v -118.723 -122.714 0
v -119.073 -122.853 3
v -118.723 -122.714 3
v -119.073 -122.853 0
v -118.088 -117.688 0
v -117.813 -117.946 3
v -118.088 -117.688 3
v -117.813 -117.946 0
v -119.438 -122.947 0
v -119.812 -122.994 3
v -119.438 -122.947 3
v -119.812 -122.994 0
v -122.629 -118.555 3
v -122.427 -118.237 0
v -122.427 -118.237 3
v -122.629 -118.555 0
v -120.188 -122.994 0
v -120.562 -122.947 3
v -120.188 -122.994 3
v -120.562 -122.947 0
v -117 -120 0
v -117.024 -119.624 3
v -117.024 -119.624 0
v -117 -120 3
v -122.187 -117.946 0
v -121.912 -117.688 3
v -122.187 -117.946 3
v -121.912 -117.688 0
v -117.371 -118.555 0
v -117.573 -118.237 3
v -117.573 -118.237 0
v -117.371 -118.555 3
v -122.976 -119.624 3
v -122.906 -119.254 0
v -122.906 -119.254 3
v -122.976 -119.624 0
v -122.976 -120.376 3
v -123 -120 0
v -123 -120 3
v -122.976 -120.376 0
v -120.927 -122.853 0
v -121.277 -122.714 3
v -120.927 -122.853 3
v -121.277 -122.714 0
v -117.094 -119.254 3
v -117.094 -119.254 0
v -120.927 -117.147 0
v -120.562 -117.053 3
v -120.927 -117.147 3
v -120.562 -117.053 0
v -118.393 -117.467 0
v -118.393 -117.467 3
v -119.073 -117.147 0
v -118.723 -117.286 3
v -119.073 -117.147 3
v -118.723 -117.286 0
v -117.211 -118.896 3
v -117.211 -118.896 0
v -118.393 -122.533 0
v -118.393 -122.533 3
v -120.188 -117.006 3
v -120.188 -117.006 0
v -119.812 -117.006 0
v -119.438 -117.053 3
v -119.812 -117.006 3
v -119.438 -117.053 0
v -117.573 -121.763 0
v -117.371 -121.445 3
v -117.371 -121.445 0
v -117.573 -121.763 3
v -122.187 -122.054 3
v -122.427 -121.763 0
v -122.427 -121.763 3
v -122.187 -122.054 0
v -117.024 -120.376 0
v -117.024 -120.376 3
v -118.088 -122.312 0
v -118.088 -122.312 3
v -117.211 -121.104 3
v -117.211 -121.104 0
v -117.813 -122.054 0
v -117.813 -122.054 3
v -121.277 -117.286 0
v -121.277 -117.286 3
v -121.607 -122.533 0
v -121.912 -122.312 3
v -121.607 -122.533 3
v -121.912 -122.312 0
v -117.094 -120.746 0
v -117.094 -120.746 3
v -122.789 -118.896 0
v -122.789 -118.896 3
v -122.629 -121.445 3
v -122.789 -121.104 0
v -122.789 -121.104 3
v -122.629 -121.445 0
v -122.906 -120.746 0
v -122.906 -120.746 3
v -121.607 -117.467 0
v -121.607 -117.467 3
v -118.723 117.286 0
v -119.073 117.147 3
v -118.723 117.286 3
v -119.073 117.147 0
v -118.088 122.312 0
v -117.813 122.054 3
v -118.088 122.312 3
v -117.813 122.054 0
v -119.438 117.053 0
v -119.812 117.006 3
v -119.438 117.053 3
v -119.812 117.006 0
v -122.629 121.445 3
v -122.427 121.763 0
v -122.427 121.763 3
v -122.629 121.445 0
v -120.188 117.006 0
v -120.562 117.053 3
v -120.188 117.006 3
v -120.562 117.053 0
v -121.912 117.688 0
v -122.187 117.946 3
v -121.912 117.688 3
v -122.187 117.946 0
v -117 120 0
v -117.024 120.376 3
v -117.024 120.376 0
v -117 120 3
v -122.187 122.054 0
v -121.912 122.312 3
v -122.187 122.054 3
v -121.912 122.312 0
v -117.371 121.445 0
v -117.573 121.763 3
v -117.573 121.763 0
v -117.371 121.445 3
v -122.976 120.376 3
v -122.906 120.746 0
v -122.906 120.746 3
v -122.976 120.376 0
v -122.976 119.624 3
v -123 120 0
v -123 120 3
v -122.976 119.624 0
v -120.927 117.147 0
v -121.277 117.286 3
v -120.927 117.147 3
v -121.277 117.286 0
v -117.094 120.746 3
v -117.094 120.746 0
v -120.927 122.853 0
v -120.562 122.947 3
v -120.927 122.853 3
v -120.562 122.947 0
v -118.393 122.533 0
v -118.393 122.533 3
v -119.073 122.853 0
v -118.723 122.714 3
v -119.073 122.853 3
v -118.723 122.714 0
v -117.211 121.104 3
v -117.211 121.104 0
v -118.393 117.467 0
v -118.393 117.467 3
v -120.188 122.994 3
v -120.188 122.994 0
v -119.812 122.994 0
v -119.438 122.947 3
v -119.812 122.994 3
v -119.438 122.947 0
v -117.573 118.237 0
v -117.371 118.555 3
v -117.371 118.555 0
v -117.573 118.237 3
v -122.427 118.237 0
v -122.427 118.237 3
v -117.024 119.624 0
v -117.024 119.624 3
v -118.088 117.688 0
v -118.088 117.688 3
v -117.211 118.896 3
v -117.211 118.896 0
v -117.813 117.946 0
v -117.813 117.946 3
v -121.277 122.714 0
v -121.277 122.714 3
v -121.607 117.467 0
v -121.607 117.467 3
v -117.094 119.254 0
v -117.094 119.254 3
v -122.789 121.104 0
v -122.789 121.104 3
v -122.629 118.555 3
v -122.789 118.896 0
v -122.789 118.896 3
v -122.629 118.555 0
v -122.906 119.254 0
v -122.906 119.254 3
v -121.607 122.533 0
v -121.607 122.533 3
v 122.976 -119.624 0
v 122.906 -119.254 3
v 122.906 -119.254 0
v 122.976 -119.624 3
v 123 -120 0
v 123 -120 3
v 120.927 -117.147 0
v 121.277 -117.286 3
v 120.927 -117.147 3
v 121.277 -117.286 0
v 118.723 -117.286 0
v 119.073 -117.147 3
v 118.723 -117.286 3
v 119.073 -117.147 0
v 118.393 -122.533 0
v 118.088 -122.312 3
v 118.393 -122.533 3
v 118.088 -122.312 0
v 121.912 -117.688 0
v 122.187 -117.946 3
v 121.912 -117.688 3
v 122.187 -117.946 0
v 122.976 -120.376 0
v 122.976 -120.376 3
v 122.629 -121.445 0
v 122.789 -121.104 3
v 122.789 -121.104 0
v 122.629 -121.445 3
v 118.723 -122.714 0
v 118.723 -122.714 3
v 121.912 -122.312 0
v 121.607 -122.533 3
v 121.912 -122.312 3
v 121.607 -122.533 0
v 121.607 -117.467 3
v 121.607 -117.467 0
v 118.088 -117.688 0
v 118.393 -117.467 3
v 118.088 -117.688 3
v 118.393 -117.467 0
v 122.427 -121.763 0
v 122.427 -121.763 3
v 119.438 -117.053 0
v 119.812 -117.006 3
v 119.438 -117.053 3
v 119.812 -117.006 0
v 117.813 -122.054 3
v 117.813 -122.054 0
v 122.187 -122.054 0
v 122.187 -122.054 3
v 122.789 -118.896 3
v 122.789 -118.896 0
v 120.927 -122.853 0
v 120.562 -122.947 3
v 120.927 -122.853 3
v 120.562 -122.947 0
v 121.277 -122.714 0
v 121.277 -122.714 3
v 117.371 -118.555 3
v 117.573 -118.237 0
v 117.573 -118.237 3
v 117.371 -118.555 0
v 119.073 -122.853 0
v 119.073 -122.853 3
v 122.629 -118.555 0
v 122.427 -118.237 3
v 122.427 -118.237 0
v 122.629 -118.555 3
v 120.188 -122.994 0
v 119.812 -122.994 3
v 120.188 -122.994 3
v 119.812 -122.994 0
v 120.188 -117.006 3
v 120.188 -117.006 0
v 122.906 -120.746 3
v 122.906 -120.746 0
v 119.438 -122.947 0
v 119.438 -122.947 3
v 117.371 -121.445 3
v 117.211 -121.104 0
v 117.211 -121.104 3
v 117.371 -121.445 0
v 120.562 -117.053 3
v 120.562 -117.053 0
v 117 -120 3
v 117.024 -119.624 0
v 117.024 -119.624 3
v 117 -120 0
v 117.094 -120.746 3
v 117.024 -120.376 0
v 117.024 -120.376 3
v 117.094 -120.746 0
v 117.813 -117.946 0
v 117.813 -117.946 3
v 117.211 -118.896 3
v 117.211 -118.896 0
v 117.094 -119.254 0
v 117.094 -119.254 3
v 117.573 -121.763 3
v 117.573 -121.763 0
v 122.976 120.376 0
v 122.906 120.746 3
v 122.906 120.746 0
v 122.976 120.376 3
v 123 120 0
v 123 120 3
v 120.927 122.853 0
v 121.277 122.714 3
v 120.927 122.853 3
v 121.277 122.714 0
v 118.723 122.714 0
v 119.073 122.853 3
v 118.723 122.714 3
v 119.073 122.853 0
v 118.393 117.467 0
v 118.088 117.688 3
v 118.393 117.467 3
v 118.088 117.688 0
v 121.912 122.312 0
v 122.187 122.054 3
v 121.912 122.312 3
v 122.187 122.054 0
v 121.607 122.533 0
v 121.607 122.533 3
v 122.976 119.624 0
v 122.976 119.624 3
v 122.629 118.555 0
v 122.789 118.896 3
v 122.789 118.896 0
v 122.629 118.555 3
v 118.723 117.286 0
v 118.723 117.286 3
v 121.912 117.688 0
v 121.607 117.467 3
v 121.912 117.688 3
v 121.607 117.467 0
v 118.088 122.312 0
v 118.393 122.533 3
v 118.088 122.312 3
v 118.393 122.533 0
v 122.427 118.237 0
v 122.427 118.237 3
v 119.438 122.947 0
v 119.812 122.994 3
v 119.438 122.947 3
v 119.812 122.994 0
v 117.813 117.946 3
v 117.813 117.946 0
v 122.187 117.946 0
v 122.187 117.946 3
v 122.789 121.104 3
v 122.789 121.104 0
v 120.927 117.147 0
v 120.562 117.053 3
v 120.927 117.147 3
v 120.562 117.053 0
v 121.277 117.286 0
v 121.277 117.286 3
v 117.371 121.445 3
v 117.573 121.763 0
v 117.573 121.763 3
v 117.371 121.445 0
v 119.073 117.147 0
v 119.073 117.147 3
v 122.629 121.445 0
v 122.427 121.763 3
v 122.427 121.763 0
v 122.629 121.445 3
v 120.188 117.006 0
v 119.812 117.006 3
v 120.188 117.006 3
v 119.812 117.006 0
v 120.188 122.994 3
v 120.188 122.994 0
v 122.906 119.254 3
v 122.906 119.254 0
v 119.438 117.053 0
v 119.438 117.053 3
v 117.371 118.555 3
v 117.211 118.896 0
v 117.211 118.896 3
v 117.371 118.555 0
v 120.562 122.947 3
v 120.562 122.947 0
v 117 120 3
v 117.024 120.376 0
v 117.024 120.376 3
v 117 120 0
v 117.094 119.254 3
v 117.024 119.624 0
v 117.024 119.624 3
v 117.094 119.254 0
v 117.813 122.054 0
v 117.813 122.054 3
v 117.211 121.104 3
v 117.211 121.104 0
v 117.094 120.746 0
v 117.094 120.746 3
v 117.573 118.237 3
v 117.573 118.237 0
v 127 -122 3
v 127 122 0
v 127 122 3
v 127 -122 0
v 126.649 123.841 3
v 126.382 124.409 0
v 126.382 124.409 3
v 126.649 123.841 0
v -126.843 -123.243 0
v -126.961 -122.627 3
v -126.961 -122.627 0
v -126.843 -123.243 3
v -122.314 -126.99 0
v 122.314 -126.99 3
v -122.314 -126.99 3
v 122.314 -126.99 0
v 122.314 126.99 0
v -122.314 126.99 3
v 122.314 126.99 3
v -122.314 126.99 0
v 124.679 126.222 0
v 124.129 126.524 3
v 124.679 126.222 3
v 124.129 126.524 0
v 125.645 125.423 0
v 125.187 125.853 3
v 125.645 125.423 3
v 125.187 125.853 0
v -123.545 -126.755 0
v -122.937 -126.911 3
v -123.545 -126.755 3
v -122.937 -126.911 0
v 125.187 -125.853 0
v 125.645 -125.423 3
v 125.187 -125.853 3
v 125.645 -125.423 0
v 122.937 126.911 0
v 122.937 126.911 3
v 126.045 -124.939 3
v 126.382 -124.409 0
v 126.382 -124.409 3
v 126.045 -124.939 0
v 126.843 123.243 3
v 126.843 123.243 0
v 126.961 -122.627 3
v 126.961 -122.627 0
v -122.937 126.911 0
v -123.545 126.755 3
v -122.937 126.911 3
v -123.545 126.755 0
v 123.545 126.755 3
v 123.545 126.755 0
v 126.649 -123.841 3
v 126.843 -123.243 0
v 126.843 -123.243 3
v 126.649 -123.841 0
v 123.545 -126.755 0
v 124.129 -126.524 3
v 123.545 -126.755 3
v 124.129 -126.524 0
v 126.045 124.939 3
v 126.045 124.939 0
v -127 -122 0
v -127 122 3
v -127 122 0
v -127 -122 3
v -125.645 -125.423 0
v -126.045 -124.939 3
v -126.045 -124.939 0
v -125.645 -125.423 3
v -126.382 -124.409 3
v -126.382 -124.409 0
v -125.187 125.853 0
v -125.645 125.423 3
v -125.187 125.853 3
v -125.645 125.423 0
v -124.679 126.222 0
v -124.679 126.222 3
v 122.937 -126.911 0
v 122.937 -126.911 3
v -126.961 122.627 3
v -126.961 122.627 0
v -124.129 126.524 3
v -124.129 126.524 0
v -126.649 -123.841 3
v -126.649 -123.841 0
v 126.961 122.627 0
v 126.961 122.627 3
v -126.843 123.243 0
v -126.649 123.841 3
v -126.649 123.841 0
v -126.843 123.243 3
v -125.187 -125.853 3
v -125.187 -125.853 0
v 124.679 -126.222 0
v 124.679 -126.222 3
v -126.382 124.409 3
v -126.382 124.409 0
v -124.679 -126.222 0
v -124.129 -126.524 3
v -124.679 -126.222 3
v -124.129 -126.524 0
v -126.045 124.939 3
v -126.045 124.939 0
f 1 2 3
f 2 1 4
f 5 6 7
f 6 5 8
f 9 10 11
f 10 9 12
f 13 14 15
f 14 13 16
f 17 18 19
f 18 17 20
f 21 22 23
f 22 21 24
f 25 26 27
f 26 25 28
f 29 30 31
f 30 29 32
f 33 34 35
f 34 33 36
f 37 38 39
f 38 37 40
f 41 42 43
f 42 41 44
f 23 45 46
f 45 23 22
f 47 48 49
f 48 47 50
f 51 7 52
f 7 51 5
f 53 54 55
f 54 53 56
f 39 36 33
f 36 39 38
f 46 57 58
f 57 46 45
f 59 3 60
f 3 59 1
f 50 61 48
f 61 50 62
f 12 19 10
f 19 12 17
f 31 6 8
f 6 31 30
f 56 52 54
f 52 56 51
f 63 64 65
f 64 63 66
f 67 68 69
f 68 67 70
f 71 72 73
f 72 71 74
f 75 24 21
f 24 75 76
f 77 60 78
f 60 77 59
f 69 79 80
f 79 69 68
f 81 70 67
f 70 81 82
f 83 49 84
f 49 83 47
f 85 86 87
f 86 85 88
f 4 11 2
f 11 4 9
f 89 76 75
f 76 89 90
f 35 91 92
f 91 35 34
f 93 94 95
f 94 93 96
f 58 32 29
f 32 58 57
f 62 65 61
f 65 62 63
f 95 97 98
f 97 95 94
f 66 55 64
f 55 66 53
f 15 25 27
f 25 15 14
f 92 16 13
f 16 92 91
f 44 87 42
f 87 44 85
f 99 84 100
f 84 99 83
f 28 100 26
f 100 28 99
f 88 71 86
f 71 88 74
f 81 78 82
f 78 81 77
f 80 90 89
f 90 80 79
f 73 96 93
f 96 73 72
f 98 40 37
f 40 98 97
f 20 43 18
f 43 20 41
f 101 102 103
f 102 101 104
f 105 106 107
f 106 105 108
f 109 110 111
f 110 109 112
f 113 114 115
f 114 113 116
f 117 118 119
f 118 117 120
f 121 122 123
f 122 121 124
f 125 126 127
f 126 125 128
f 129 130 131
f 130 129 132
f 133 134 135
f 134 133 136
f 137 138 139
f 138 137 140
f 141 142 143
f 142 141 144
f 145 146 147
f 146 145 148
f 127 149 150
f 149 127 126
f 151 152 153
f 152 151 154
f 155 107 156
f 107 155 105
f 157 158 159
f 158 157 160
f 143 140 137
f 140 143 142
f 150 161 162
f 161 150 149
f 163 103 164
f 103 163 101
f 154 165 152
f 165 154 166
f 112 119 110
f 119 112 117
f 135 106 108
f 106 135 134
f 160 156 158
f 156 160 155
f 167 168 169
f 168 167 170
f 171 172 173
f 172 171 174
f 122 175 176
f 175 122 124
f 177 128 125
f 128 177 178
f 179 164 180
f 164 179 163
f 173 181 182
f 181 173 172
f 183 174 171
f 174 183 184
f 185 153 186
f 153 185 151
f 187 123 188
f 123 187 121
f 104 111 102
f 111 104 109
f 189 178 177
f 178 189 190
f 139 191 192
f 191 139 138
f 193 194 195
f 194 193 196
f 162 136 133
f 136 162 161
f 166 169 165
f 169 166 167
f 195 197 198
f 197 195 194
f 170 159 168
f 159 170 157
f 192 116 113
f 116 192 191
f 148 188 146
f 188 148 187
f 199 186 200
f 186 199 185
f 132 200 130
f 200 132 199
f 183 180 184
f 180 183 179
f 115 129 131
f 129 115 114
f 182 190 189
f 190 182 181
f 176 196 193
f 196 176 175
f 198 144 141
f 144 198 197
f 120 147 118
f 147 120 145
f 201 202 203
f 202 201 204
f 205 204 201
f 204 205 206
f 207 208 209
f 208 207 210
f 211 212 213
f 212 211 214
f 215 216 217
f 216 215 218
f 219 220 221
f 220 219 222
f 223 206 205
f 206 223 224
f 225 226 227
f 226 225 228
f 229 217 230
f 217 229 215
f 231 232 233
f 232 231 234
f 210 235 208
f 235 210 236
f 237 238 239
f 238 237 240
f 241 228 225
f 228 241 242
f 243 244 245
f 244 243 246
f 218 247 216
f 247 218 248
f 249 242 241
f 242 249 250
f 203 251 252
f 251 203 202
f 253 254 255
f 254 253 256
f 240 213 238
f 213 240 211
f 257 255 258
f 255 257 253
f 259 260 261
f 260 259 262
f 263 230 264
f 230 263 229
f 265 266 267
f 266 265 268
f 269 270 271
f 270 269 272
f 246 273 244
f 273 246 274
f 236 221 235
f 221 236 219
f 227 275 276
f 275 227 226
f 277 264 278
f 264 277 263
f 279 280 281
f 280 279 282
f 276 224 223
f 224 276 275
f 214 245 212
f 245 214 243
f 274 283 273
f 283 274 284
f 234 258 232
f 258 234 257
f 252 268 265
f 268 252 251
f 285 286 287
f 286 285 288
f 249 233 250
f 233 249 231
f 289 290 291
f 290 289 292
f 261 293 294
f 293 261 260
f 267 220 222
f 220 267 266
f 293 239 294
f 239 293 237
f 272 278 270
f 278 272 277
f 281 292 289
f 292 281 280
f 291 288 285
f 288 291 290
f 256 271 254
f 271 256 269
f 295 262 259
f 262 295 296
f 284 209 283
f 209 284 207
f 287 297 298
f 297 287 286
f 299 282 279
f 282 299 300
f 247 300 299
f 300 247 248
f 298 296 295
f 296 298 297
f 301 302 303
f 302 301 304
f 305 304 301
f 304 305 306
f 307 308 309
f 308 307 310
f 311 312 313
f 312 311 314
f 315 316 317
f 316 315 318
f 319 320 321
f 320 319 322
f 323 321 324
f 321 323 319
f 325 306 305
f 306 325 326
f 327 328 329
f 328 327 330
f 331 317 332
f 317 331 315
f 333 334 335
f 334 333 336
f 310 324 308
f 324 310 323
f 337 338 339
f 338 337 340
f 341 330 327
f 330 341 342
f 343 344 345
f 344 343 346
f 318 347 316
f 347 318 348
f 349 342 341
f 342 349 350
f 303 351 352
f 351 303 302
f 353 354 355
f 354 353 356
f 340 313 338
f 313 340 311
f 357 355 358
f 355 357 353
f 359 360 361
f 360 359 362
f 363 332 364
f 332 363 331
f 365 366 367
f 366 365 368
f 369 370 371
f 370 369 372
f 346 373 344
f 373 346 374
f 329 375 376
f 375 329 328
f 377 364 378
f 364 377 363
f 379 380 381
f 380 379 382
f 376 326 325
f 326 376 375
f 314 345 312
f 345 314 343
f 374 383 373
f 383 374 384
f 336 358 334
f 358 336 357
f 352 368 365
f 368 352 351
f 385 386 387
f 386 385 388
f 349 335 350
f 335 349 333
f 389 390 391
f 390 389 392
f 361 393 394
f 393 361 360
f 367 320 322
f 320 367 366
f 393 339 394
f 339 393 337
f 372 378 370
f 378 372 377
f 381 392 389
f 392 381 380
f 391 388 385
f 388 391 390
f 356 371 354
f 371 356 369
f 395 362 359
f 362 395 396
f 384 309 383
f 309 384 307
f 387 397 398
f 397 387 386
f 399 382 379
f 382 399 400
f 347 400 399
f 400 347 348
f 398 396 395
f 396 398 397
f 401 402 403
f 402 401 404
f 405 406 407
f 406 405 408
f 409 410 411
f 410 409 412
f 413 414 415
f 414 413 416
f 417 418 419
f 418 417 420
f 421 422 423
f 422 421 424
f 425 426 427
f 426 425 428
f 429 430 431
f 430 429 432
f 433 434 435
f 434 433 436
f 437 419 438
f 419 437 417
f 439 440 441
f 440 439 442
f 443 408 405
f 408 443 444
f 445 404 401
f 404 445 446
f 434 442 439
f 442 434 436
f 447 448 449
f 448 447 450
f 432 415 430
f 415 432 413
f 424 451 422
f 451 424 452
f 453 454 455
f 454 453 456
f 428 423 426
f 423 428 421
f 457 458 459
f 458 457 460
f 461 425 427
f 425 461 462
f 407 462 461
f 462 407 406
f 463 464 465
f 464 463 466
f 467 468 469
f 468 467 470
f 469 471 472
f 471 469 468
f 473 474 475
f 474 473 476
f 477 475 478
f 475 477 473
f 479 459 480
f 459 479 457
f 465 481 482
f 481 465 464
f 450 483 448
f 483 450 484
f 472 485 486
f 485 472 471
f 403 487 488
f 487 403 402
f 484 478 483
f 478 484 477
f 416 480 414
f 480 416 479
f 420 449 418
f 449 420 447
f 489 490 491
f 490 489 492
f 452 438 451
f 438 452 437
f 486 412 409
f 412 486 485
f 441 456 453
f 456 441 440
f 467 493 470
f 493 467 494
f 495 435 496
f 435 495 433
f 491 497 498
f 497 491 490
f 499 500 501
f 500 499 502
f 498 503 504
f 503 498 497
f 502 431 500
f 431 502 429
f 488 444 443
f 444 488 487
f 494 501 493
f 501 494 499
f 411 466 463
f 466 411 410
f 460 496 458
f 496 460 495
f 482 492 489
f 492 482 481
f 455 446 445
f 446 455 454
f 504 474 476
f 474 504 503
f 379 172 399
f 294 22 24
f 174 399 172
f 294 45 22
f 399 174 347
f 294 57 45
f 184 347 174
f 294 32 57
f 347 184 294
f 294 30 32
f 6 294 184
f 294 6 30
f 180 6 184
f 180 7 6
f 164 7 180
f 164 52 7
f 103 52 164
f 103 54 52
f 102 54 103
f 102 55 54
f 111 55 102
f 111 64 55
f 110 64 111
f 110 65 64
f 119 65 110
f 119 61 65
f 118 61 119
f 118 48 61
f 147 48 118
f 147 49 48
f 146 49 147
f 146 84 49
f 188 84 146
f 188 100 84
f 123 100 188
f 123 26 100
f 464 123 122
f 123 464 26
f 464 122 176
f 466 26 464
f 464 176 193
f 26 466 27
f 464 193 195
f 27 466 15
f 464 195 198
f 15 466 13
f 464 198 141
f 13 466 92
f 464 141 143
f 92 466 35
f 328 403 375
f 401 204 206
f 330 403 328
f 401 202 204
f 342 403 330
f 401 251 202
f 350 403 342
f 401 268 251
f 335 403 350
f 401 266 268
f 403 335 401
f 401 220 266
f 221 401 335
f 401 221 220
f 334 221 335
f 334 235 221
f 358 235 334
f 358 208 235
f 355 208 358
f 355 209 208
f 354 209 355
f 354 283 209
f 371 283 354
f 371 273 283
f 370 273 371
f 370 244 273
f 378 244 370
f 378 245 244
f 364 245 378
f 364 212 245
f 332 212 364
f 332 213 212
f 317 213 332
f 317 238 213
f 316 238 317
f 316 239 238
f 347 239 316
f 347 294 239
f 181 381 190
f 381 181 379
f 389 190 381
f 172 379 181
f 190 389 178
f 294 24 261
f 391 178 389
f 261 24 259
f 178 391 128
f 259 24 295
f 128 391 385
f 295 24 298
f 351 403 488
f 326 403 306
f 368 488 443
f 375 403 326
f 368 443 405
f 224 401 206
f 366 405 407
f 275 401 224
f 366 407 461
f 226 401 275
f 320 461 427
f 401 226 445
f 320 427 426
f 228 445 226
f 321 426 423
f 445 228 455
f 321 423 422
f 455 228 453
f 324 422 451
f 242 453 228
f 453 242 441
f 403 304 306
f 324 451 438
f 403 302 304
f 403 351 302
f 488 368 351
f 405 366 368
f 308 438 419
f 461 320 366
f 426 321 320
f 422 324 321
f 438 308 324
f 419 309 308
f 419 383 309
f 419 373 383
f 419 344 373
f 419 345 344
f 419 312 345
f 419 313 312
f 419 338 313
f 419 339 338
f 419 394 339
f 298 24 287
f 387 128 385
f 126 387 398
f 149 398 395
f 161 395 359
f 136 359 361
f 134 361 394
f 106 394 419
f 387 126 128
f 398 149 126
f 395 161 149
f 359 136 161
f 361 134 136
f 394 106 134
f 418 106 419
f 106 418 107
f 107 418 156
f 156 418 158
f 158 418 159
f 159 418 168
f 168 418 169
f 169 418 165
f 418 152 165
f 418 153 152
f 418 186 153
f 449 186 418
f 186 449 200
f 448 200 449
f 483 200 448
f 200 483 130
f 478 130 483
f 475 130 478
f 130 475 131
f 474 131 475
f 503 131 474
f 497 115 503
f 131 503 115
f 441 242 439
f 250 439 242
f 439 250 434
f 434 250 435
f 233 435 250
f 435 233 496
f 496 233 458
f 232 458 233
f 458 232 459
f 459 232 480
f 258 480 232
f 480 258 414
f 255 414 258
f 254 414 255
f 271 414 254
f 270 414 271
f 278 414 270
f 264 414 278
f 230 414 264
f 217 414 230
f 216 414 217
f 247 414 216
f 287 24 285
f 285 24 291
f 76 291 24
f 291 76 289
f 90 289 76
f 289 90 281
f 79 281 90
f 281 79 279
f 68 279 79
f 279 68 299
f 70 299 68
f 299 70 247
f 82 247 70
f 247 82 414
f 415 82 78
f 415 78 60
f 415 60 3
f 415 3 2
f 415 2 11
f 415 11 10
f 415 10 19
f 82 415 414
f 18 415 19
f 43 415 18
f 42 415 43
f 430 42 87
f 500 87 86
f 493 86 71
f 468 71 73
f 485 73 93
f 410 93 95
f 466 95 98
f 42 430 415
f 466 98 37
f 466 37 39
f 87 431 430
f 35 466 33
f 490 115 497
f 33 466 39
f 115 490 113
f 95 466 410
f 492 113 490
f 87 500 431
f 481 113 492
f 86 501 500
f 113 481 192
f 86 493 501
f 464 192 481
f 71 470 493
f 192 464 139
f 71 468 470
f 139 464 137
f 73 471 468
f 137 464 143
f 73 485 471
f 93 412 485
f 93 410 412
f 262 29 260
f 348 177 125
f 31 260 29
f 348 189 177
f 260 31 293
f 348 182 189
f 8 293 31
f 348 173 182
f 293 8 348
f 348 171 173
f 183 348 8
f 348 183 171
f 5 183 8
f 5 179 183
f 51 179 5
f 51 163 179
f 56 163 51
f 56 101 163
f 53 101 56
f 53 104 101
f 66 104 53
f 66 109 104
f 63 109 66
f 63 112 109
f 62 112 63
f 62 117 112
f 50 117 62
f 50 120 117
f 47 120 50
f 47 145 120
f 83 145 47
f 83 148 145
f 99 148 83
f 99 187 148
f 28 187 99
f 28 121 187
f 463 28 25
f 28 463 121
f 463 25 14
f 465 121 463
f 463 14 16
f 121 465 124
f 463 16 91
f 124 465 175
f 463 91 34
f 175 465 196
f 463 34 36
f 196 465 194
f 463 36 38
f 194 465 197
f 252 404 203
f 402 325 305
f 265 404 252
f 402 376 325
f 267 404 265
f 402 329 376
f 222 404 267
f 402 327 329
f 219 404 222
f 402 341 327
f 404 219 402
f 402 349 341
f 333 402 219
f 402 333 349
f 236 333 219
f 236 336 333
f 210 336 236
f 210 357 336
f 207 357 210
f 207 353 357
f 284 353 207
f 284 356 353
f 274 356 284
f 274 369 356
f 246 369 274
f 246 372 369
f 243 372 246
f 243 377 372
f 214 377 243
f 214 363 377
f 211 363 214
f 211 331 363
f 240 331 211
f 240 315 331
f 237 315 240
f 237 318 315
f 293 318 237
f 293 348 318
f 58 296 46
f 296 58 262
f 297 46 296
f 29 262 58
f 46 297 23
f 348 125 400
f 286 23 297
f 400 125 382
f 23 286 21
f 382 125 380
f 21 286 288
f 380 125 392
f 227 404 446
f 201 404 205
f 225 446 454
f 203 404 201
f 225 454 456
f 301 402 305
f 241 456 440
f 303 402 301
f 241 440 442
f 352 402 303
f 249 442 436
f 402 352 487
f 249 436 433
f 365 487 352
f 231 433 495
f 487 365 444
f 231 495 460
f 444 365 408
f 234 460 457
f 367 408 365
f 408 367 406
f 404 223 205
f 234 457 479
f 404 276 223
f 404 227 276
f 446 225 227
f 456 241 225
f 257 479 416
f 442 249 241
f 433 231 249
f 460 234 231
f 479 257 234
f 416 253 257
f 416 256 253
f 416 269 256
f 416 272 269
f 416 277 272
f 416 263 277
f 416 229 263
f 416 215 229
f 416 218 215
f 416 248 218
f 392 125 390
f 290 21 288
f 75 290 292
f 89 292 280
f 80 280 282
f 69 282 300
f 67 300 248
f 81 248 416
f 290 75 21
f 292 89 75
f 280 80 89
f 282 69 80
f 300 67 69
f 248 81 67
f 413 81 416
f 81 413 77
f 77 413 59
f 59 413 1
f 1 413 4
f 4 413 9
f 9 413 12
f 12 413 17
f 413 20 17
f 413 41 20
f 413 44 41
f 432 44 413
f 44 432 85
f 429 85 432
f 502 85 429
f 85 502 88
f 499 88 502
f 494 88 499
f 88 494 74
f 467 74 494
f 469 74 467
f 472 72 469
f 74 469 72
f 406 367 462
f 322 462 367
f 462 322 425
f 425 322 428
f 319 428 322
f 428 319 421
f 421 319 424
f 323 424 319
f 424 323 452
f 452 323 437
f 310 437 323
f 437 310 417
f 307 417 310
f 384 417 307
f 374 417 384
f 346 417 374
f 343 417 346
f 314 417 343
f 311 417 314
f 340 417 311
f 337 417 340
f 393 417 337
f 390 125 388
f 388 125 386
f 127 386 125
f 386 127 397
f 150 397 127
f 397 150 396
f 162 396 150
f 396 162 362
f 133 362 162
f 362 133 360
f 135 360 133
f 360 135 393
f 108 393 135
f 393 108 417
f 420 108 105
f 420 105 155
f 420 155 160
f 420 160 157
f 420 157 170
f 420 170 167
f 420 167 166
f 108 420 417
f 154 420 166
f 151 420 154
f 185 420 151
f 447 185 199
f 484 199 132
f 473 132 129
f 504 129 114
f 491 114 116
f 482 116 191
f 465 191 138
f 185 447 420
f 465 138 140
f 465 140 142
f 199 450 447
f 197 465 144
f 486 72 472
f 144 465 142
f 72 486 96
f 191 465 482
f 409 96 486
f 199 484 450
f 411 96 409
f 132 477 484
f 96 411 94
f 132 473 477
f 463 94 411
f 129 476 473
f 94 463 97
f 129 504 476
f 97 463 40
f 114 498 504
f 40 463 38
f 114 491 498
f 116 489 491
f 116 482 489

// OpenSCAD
$fn = 50;


difference() {
	union() {
		hull() {
			translate(v = [-122.0000000000, 122.0000000000, 0]) {
				cylinder(h = 3, r = 5);
			}
			translate(v = [122.0000000000, 122.0000000000, 0]) {
				cylinder(h = 3, r = 5);
			}
			translate(v = [-122.0000000000, -122.0000000000, 0]) {
				cylinder(h = 3, r = 5);
			}
			translate(v = [122.0000000000, -122.0000000000, 0]) {
				cylinder(h = 3, r = 5);
			}
		}
	}
	union() {
		translate(v = [-120.0000000000, -120.0000000000, -100.0000000000]) {
			cylinder(h = 200, r = 3.0000000000);
		}
		translate(v = [-120.0000000000, 120.0000000000, -100.0000000000]) {
			cylinder(h = 200, r = 3.0000000000);
		}
		translate(v = [120.0000000000, -120.0000000000, -100.0000000000]) {
			cylinder(h = 200, r = 3.0000000000);
		}
		translate(v = [120.0000000000, 120.0000000000, -100.0000000000]) {
			cylinder(h = 200, r = 3.0000000000);
		}
	}
}
